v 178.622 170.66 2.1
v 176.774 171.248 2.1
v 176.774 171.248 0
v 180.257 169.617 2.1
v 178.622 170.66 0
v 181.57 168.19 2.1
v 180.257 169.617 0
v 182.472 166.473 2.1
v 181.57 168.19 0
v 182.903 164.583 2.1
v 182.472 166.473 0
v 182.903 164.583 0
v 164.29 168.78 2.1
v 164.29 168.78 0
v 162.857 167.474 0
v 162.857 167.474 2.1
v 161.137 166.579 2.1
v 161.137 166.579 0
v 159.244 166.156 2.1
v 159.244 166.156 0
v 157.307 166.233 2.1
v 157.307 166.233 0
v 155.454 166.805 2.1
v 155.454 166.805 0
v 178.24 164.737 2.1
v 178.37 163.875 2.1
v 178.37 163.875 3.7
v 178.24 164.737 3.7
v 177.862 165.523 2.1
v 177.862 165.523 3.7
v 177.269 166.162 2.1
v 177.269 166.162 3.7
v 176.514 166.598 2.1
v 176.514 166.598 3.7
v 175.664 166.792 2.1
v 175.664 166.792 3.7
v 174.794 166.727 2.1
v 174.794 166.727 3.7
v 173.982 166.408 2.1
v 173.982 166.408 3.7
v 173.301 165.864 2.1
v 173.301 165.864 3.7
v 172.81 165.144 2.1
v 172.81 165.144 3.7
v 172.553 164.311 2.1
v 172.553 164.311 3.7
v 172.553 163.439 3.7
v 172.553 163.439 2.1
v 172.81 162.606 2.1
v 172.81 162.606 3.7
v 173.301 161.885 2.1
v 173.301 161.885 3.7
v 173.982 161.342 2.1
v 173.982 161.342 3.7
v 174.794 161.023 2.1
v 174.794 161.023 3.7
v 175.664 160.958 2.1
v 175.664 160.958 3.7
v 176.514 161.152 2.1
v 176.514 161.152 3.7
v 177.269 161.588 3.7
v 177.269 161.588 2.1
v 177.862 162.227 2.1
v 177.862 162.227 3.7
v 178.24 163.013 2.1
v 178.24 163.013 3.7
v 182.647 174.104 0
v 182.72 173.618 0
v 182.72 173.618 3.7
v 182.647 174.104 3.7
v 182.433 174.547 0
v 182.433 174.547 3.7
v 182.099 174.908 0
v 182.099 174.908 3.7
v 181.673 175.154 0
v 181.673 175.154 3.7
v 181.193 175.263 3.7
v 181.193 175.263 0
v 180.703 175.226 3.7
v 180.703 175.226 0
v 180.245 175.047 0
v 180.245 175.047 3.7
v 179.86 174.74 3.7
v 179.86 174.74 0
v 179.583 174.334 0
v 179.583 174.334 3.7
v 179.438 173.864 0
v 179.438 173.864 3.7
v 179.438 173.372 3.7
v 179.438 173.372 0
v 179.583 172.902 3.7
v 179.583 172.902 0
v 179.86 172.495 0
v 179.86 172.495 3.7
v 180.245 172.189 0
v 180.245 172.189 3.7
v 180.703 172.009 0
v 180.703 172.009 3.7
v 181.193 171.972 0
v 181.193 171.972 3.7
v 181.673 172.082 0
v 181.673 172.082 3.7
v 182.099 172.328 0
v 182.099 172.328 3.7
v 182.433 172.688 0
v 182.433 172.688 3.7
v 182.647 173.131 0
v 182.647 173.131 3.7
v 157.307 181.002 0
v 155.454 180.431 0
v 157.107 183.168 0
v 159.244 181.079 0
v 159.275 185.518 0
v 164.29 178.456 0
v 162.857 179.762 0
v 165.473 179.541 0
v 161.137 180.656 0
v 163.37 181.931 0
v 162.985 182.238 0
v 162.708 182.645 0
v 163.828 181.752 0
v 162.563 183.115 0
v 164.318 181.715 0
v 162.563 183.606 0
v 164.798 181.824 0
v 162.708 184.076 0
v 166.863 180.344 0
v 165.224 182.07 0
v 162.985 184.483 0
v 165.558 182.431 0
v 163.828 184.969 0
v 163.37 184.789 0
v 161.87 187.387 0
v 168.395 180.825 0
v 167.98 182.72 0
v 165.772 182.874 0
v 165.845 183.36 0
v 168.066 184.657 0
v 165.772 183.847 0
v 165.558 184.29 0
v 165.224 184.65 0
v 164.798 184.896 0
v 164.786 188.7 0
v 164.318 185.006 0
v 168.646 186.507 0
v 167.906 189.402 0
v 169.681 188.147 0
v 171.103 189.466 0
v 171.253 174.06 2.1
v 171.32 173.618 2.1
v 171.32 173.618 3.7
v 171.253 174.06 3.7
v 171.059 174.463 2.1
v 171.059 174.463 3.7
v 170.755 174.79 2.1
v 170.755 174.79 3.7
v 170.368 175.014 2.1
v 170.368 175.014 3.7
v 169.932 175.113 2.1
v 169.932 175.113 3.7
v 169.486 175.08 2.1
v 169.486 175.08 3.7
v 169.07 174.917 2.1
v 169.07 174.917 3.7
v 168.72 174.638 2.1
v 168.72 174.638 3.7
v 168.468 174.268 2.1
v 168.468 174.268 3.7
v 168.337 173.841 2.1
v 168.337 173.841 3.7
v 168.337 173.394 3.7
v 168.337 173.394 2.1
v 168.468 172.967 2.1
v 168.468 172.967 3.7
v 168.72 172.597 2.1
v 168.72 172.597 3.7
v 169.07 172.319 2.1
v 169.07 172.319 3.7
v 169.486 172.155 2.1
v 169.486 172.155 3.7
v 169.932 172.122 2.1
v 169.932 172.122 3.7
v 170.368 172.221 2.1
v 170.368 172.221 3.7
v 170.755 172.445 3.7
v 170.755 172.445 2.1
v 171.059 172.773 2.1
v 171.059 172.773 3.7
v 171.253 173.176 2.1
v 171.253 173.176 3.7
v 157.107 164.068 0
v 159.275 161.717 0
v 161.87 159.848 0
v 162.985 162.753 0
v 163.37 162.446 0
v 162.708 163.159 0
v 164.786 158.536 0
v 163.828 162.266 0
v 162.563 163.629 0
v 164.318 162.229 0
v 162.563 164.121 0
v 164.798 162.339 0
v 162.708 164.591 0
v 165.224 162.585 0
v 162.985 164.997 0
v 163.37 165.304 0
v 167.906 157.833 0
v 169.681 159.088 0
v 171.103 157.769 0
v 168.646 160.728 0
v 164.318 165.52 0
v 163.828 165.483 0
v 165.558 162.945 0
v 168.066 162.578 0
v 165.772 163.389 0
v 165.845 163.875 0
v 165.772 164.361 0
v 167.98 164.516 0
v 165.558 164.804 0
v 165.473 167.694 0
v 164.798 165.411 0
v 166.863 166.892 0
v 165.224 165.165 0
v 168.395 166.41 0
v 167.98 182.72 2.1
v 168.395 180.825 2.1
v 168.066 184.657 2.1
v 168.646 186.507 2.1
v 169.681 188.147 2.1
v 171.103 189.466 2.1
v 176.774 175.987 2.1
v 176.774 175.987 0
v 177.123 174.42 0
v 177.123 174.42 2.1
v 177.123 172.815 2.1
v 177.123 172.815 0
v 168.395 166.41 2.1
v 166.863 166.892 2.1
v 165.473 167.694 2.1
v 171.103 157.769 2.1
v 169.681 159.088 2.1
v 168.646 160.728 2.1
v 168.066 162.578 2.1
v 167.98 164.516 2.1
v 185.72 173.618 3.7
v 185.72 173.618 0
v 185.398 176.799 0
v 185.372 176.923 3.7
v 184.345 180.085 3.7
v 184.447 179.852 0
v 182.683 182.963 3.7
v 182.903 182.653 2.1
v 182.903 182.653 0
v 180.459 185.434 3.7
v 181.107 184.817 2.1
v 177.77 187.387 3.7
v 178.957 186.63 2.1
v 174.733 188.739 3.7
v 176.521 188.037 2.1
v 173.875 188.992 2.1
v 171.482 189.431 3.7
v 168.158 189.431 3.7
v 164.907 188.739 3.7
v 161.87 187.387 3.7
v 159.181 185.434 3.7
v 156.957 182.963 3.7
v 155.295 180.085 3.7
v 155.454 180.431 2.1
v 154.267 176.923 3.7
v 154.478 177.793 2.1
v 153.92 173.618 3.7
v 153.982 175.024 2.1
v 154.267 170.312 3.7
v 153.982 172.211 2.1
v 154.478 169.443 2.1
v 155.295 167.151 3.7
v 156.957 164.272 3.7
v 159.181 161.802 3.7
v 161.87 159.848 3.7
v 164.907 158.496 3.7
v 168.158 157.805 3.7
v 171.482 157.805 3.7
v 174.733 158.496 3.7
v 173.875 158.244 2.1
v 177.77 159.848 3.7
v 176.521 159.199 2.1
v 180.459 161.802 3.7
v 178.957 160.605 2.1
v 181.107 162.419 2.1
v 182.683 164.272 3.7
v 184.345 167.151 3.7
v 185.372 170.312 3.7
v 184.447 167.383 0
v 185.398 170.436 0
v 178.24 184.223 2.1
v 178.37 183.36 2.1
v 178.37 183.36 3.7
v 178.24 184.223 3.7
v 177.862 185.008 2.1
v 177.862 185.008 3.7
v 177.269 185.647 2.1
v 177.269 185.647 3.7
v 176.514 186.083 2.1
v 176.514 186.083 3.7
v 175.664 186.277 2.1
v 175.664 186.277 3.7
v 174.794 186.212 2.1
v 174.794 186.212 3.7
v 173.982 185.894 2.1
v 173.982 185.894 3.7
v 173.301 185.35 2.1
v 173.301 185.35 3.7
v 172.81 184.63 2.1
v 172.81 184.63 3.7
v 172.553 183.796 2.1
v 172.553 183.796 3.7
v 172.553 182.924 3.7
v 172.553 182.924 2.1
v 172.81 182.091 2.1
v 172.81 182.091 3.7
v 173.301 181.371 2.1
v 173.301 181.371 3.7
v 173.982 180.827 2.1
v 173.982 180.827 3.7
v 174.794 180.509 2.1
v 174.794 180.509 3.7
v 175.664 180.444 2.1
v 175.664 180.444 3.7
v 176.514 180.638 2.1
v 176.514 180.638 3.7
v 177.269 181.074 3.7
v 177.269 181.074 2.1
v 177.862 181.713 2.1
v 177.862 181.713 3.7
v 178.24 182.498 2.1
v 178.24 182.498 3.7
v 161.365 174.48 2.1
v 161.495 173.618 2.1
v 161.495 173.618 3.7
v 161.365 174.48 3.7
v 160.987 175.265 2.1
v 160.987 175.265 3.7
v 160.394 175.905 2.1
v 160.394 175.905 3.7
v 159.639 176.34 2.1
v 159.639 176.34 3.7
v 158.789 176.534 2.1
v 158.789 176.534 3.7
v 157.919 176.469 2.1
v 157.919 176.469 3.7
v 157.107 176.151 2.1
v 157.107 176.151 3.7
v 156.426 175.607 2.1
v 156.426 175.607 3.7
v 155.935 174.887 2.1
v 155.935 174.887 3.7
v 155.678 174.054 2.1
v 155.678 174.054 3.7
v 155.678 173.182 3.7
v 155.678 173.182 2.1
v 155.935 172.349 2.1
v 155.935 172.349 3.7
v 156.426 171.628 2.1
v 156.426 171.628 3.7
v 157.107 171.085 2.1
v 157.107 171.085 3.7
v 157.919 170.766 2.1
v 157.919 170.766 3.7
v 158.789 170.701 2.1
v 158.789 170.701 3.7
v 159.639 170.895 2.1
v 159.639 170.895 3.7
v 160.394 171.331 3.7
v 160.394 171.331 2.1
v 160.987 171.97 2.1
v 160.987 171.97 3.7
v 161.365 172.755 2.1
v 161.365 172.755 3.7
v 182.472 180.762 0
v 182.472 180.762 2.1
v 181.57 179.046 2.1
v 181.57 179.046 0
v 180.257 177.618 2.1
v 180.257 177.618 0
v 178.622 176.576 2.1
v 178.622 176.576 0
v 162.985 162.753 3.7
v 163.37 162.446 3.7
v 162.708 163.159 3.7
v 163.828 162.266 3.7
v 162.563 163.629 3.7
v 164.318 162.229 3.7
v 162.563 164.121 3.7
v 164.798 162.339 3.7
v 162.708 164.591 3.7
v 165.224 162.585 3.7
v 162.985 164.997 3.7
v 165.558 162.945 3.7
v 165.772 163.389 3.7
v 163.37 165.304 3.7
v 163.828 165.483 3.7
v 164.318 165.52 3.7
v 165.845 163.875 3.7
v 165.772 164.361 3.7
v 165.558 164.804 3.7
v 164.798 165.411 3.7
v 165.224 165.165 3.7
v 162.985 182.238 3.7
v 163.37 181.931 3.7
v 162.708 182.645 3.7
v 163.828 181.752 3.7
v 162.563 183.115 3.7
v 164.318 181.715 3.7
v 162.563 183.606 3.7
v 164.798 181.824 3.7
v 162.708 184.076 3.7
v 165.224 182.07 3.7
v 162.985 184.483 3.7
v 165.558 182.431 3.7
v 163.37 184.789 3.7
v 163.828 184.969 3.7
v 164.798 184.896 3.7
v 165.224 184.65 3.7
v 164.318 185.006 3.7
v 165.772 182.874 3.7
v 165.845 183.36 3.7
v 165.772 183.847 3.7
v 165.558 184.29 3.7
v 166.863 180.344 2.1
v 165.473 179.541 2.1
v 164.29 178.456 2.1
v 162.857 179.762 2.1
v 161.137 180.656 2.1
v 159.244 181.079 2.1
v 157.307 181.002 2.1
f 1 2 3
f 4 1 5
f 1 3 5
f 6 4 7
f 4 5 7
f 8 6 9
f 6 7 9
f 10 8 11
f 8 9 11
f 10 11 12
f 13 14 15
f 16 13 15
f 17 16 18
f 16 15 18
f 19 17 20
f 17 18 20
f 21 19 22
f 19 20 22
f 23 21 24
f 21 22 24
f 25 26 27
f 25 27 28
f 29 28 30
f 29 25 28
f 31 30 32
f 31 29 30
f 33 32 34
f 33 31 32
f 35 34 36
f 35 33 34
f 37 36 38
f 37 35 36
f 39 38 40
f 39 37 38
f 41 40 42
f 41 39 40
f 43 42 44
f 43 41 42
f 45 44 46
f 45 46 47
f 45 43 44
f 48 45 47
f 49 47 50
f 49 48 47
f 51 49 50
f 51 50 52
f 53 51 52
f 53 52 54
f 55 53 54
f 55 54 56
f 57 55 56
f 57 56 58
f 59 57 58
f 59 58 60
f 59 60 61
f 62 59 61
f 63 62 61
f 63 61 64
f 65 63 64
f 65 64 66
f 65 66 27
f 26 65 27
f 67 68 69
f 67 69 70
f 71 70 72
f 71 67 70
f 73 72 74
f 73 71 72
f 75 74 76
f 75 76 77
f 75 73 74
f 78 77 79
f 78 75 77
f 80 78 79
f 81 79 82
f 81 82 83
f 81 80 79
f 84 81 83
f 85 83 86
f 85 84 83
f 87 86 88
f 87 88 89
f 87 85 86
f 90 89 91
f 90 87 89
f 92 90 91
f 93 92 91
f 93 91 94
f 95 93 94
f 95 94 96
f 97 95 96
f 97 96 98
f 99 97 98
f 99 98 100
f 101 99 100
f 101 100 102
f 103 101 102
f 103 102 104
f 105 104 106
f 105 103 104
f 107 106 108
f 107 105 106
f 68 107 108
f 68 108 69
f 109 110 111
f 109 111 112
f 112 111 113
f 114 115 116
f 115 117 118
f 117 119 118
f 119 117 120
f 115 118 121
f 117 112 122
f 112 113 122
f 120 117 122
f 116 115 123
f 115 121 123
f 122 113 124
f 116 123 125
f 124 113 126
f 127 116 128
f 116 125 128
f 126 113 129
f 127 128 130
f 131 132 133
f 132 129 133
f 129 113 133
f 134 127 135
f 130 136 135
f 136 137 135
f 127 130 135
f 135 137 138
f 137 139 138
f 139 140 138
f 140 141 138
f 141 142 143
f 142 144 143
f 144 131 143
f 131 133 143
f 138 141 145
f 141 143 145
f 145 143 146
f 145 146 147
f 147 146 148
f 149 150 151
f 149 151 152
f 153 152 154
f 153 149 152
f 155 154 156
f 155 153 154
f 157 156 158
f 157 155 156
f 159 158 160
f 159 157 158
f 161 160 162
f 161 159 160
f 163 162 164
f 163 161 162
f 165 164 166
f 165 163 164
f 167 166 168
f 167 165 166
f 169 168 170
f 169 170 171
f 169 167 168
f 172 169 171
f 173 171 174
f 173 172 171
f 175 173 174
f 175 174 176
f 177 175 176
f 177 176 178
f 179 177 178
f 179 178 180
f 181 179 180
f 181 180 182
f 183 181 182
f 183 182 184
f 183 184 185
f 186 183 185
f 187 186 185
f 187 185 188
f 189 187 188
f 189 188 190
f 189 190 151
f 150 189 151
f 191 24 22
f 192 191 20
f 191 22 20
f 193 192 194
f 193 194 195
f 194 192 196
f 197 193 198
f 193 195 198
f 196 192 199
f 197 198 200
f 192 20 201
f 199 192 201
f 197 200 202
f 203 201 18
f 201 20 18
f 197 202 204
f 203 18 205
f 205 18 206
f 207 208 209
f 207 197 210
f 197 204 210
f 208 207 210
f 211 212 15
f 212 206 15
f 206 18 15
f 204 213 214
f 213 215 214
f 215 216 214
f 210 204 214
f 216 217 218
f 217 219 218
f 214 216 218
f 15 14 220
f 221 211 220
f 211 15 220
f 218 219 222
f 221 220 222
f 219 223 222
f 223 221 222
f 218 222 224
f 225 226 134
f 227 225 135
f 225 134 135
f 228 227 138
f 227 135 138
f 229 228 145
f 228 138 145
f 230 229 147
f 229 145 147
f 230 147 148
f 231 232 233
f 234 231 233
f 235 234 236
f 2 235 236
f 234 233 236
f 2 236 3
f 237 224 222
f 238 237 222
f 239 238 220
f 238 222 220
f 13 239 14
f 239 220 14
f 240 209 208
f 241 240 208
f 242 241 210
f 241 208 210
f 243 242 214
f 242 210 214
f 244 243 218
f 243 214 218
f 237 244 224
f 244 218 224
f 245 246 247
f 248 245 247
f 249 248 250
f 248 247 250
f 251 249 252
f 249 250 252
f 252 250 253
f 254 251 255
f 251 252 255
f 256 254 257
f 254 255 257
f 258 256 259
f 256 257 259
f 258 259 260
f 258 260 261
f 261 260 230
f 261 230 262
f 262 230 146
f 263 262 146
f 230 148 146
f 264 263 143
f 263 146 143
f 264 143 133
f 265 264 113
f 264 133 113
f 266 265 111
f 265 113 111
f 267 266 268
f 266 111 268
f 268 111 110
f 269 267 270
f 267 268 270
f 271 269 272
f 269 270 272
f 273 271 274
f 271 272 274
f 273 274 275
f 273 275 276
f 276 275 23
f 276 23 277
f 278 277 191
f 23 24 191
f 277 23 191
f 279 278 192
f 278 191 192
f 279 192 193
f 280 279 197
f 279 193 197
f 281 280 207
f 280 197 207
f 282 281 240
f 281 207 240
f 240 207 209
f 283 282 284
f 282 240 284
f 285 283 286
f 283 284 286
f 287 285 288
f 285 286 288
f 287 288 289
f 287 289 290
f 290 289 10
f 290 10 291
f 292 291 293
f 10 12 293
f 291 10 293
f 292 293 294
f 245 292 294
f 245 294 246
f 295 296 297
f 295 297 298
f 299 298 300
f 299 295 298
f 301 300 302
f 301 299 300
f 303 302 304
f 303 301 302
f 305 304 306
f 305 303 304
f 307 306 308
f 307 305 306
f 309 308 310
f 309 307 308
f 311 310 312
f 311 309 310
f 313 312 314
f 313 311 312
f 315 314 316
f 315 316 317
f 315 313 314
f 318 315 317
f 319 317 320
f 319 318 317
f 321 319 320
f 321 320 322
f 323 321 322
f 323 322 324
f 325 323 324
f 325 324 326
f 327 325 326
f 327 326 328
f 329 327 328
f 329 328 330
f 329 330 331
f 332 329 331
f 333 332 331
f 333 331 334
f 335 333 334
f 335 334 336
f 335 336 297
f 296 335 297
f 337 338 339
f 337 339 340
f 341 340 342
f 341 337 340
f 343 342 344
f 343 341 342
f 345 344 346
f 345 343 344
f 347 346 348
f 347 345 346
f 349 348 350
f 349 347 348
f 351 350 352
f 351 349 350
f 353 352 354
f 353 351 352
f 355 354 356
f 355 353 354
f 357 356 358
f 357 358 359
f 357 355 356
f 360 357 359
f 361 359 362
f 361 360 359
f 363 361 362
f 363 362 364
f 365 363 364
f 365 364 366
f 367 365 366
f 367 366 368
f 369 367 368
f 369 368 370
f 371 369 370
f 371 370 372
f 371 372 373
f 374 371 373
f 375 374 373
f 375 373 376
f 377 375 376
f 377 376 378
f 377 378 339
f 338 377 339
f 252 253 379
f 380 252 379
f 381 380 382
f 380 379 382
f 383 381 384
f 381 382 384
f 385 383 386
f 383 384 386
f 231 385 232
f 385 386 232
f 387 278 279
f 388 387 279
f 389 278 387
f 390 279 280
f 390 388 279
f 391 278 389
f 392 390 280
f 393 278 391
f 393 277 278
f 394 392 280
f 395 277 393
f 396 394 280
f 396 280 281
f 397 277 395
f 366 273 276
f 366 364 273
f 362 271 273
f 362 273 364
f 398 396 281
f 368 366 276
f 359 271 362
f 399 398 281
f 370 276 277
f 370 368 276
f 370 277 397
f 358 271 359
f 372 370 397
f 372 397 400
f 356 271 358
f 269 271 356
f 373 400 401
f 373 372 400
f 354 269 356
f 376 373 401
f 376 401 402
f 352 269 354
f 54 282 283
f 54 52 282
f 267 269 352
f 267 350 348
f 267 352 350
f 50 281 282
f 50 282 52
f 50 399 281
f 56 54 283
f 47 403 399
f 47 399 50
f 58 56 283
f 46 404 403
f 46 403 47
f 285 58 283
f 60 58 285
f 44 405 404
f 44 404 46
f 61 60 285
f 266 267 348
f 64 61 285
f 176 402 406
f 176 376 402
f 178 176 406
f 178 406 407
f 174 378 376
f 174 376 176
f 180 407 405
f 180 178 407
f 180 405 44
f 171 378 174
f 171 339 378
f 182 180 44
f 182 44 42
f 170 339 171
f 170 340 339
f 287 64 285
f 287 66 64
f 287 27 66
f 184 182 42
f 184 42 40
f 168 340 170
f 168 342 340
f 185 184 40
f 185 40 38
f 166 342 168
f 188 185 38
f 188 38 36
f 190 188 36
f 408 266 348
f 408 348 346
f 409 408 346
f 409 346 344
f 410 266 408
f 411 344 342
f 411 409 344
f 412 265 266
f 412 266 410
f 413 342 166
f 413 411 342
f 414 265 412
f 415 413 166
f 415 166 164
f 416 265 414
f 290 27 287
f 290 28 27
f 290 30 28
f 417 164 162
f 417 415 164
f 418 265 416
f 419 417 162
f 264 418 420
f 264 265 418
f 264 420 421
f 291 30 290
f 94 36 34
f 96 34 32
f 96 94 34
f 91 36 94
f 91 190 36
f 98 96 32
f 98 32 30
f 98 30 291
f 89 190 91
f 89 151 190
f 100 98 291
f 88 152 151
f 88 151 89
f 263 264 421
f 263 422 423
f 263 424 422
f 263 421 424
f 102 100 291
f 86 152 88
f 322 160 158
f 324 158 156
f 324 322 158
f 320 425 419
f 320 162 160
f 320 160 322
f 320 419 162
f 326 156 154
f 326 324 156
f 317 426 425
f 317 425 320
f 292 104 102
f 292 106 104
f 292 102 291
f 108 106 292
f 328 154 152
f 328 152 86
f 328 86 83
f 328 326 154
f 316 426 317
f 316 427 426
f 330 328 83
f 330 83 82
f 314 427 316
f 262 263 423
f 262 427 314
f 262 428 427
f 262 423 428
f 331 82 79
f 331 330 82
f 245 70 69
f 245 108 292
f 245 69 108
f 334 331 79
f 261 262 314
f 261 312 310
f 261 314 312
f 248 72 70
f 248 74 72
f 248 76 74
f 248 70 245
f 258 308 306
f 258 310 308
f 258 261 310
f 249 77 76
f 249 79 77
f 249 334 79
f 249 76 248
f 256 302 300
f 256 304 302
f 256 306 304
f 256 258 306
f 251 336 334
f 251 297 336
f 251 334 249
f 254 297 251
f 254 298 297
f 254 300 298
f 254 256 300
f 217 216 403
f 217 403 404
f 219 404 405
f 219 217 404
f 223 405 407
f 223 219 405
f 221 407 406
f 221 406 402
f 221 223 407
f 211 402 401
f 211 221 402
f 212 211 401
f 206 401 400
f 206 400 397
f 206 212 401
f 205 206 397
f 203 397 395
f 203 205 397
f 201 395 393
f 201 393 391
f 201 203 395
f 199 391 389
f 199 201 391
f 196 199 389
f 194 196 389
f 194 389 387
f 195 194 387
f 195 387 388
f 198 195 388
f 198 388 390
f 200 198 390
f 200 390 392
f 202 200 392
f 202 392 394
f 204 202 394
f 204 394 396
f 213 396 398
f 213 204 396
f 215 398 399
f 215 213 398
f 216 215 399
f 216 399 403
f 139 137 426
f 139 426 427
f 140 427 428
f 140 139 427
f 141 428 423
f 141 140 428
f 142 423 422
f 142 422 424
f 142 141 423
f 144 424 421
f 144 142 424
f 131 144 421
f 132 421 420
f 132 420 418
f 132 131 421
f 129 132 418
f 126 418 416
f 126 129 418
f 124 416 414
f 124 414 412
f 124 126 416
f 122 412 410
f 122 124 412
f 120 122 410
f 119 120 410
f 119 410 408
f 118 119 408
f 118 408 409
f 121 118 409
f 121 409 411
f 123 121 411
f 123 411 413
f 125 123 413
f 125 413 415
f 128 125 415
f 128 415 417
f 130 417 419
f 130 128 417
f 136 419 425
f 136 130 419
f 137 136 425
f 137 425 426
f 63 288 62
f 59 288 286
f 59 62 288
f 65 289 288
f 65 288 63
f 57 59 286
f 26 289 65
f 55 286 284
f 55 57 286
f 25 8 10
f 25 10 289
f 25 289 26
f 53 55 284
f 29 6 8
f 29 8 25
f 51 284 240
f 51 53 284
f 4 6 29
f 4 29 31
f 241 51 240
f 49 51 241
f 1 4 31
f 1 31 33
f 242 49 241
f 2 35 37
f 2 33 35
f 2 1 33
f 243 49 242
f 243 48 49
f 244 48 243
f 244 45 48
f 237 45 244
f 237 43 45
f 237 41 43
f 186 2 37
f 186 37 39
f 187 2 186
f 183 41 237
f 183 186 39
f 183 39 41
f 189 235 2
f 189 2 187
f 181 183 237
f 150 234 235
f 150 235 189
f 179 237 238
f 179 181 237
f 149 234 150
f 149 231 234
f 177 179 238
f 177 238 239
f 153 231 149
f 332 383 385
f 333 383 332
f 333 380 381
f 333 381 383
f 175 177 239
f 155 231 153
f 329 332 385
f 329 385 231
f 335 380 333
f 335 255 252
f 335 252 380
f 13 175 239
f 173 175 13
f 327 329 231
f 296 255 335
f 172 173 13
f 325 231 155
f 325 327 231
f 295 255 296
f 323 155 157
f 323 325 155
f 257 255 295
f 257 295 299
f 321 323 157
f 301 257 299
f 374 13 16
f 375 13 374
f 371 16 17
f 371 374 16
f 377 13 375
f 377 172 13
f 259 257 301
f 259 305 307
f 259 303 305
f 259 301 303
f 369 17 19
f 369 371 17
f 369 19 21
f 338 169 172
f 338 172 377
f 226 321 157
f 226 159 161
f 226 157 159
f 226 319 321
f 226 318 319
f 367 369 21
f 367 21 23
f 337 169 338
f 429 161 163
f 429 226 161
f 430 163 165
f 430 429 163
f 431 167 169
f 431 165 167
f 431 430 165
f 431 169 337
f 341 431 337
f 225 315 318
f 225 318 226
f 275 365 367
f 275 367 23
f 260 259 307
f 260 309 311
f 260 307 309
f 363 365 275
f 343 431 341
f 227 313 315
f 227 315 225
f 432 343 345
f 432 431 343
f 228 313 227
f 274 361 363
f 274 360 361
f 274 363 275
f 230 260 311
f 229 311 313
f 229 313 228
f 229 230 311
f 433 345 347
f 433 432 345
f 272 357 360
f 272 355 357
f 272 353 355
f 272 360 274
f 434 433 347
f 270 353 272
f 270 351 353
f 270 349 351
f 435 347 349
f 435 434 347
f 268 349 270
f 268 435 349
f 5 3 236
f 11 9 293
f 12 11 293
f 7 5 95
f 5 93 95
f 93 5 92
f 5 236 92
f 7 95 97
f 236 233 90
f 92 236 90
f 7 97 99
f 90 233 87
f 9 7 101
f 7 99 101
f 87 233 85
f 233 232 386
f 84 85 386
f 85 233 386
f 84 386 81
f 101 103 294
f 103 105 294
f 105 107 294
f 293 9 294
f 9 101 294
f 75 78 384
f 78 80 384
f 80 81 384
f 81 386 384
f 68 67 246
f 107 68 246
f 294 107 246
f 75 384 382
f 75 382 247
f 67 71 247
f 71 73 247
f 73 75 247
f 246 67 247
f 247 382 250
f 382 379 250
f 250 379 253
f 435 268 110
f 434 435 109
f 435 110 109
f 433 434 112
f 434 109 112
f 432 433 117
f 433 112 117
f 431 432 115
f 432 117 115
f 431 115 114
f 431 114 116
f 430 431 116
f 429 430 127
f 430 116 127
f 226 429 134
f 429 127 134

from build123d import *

# Parameters (mm, degrees)
SKETCH1_R           = 15.9
SKETCH1_R_2         = 1.65
SKETCH1_R_3         = 2.925
SKETCH1_R_4         = 1.5
BOSS_EXTRUDE1_DEPTH = 3.7
SKETCH2_R           = 7.347175161
SKETCH2_R_2         = 7.491995358
CUT_EXTRUDE1_DEPTH  = 2.1


with BuildPart() as part:
    # Sketch1 → Boss-Extrude1 (new body)
    with BuildSketch(Plane.XY):
        with Locations((169.819947444, 173.617651357)):
            Circle(SKETCH1_R)
        with Locations((181.069947444, 173.617651357)):
            Circle(SKETCH1_R_2, mode=Mode.SUBTRACT)
        with Locations((158.569947444, 173.617651357)):
            Circle(SKETCH1_R_3, mode=Mode.SUBTRACT)
        with Locations((164.194947444, 163.874865564)):
            Circle(SKETCH1_R_2, mode=Mode.SUBTRACT)
        with Locations((164.194947444, 183.360437149)):
            Circle(SKETCH1_R_2, mode=Mode.SUBTRACT)
        with Locations((175.444947444, 183.360437149)):
            Circle(SKETCH1_R_3, mode=Mode.SUBTRACT)
        with Locations((175.444947444, 163.874865564)):
            Circle(SKETCH1_R_3, mode=Mode.SUBTRACT)
        with Locations((169.819947444, 173.617651357)):
            Circle(SKETCH1_R_4, mode=Mode.SUBTRACT)
    extrude(amount=BOSS_EXTRUDE1_DEPTH)

    # Sketch2 → Cut-Extrude1 (cut)
    with BuildSketch(Plane(origin=(0, 0, 0), x_dir=(-1, 0, 0), z_dir=(0, 0, -1))):
        with Locations((-169.819947444, 173.617651357)):
            Circle(SKETCH2_R)
        with Locations((-158.569947444, 173.617651357)):
            Circle(SKETCH2_R_2)
        with Locations((-175.444947444, 163.874865564)):
            Circle(SKETCH2_R_2)
        with Locations((-175.444947444, 183.360437149)):
            Circle(SKETCH2_R_2)
    extrude(amount=-CUT_EXTRUDE1_DEPTH, mode=Mode.SUBTRACT)


solid = part.part
